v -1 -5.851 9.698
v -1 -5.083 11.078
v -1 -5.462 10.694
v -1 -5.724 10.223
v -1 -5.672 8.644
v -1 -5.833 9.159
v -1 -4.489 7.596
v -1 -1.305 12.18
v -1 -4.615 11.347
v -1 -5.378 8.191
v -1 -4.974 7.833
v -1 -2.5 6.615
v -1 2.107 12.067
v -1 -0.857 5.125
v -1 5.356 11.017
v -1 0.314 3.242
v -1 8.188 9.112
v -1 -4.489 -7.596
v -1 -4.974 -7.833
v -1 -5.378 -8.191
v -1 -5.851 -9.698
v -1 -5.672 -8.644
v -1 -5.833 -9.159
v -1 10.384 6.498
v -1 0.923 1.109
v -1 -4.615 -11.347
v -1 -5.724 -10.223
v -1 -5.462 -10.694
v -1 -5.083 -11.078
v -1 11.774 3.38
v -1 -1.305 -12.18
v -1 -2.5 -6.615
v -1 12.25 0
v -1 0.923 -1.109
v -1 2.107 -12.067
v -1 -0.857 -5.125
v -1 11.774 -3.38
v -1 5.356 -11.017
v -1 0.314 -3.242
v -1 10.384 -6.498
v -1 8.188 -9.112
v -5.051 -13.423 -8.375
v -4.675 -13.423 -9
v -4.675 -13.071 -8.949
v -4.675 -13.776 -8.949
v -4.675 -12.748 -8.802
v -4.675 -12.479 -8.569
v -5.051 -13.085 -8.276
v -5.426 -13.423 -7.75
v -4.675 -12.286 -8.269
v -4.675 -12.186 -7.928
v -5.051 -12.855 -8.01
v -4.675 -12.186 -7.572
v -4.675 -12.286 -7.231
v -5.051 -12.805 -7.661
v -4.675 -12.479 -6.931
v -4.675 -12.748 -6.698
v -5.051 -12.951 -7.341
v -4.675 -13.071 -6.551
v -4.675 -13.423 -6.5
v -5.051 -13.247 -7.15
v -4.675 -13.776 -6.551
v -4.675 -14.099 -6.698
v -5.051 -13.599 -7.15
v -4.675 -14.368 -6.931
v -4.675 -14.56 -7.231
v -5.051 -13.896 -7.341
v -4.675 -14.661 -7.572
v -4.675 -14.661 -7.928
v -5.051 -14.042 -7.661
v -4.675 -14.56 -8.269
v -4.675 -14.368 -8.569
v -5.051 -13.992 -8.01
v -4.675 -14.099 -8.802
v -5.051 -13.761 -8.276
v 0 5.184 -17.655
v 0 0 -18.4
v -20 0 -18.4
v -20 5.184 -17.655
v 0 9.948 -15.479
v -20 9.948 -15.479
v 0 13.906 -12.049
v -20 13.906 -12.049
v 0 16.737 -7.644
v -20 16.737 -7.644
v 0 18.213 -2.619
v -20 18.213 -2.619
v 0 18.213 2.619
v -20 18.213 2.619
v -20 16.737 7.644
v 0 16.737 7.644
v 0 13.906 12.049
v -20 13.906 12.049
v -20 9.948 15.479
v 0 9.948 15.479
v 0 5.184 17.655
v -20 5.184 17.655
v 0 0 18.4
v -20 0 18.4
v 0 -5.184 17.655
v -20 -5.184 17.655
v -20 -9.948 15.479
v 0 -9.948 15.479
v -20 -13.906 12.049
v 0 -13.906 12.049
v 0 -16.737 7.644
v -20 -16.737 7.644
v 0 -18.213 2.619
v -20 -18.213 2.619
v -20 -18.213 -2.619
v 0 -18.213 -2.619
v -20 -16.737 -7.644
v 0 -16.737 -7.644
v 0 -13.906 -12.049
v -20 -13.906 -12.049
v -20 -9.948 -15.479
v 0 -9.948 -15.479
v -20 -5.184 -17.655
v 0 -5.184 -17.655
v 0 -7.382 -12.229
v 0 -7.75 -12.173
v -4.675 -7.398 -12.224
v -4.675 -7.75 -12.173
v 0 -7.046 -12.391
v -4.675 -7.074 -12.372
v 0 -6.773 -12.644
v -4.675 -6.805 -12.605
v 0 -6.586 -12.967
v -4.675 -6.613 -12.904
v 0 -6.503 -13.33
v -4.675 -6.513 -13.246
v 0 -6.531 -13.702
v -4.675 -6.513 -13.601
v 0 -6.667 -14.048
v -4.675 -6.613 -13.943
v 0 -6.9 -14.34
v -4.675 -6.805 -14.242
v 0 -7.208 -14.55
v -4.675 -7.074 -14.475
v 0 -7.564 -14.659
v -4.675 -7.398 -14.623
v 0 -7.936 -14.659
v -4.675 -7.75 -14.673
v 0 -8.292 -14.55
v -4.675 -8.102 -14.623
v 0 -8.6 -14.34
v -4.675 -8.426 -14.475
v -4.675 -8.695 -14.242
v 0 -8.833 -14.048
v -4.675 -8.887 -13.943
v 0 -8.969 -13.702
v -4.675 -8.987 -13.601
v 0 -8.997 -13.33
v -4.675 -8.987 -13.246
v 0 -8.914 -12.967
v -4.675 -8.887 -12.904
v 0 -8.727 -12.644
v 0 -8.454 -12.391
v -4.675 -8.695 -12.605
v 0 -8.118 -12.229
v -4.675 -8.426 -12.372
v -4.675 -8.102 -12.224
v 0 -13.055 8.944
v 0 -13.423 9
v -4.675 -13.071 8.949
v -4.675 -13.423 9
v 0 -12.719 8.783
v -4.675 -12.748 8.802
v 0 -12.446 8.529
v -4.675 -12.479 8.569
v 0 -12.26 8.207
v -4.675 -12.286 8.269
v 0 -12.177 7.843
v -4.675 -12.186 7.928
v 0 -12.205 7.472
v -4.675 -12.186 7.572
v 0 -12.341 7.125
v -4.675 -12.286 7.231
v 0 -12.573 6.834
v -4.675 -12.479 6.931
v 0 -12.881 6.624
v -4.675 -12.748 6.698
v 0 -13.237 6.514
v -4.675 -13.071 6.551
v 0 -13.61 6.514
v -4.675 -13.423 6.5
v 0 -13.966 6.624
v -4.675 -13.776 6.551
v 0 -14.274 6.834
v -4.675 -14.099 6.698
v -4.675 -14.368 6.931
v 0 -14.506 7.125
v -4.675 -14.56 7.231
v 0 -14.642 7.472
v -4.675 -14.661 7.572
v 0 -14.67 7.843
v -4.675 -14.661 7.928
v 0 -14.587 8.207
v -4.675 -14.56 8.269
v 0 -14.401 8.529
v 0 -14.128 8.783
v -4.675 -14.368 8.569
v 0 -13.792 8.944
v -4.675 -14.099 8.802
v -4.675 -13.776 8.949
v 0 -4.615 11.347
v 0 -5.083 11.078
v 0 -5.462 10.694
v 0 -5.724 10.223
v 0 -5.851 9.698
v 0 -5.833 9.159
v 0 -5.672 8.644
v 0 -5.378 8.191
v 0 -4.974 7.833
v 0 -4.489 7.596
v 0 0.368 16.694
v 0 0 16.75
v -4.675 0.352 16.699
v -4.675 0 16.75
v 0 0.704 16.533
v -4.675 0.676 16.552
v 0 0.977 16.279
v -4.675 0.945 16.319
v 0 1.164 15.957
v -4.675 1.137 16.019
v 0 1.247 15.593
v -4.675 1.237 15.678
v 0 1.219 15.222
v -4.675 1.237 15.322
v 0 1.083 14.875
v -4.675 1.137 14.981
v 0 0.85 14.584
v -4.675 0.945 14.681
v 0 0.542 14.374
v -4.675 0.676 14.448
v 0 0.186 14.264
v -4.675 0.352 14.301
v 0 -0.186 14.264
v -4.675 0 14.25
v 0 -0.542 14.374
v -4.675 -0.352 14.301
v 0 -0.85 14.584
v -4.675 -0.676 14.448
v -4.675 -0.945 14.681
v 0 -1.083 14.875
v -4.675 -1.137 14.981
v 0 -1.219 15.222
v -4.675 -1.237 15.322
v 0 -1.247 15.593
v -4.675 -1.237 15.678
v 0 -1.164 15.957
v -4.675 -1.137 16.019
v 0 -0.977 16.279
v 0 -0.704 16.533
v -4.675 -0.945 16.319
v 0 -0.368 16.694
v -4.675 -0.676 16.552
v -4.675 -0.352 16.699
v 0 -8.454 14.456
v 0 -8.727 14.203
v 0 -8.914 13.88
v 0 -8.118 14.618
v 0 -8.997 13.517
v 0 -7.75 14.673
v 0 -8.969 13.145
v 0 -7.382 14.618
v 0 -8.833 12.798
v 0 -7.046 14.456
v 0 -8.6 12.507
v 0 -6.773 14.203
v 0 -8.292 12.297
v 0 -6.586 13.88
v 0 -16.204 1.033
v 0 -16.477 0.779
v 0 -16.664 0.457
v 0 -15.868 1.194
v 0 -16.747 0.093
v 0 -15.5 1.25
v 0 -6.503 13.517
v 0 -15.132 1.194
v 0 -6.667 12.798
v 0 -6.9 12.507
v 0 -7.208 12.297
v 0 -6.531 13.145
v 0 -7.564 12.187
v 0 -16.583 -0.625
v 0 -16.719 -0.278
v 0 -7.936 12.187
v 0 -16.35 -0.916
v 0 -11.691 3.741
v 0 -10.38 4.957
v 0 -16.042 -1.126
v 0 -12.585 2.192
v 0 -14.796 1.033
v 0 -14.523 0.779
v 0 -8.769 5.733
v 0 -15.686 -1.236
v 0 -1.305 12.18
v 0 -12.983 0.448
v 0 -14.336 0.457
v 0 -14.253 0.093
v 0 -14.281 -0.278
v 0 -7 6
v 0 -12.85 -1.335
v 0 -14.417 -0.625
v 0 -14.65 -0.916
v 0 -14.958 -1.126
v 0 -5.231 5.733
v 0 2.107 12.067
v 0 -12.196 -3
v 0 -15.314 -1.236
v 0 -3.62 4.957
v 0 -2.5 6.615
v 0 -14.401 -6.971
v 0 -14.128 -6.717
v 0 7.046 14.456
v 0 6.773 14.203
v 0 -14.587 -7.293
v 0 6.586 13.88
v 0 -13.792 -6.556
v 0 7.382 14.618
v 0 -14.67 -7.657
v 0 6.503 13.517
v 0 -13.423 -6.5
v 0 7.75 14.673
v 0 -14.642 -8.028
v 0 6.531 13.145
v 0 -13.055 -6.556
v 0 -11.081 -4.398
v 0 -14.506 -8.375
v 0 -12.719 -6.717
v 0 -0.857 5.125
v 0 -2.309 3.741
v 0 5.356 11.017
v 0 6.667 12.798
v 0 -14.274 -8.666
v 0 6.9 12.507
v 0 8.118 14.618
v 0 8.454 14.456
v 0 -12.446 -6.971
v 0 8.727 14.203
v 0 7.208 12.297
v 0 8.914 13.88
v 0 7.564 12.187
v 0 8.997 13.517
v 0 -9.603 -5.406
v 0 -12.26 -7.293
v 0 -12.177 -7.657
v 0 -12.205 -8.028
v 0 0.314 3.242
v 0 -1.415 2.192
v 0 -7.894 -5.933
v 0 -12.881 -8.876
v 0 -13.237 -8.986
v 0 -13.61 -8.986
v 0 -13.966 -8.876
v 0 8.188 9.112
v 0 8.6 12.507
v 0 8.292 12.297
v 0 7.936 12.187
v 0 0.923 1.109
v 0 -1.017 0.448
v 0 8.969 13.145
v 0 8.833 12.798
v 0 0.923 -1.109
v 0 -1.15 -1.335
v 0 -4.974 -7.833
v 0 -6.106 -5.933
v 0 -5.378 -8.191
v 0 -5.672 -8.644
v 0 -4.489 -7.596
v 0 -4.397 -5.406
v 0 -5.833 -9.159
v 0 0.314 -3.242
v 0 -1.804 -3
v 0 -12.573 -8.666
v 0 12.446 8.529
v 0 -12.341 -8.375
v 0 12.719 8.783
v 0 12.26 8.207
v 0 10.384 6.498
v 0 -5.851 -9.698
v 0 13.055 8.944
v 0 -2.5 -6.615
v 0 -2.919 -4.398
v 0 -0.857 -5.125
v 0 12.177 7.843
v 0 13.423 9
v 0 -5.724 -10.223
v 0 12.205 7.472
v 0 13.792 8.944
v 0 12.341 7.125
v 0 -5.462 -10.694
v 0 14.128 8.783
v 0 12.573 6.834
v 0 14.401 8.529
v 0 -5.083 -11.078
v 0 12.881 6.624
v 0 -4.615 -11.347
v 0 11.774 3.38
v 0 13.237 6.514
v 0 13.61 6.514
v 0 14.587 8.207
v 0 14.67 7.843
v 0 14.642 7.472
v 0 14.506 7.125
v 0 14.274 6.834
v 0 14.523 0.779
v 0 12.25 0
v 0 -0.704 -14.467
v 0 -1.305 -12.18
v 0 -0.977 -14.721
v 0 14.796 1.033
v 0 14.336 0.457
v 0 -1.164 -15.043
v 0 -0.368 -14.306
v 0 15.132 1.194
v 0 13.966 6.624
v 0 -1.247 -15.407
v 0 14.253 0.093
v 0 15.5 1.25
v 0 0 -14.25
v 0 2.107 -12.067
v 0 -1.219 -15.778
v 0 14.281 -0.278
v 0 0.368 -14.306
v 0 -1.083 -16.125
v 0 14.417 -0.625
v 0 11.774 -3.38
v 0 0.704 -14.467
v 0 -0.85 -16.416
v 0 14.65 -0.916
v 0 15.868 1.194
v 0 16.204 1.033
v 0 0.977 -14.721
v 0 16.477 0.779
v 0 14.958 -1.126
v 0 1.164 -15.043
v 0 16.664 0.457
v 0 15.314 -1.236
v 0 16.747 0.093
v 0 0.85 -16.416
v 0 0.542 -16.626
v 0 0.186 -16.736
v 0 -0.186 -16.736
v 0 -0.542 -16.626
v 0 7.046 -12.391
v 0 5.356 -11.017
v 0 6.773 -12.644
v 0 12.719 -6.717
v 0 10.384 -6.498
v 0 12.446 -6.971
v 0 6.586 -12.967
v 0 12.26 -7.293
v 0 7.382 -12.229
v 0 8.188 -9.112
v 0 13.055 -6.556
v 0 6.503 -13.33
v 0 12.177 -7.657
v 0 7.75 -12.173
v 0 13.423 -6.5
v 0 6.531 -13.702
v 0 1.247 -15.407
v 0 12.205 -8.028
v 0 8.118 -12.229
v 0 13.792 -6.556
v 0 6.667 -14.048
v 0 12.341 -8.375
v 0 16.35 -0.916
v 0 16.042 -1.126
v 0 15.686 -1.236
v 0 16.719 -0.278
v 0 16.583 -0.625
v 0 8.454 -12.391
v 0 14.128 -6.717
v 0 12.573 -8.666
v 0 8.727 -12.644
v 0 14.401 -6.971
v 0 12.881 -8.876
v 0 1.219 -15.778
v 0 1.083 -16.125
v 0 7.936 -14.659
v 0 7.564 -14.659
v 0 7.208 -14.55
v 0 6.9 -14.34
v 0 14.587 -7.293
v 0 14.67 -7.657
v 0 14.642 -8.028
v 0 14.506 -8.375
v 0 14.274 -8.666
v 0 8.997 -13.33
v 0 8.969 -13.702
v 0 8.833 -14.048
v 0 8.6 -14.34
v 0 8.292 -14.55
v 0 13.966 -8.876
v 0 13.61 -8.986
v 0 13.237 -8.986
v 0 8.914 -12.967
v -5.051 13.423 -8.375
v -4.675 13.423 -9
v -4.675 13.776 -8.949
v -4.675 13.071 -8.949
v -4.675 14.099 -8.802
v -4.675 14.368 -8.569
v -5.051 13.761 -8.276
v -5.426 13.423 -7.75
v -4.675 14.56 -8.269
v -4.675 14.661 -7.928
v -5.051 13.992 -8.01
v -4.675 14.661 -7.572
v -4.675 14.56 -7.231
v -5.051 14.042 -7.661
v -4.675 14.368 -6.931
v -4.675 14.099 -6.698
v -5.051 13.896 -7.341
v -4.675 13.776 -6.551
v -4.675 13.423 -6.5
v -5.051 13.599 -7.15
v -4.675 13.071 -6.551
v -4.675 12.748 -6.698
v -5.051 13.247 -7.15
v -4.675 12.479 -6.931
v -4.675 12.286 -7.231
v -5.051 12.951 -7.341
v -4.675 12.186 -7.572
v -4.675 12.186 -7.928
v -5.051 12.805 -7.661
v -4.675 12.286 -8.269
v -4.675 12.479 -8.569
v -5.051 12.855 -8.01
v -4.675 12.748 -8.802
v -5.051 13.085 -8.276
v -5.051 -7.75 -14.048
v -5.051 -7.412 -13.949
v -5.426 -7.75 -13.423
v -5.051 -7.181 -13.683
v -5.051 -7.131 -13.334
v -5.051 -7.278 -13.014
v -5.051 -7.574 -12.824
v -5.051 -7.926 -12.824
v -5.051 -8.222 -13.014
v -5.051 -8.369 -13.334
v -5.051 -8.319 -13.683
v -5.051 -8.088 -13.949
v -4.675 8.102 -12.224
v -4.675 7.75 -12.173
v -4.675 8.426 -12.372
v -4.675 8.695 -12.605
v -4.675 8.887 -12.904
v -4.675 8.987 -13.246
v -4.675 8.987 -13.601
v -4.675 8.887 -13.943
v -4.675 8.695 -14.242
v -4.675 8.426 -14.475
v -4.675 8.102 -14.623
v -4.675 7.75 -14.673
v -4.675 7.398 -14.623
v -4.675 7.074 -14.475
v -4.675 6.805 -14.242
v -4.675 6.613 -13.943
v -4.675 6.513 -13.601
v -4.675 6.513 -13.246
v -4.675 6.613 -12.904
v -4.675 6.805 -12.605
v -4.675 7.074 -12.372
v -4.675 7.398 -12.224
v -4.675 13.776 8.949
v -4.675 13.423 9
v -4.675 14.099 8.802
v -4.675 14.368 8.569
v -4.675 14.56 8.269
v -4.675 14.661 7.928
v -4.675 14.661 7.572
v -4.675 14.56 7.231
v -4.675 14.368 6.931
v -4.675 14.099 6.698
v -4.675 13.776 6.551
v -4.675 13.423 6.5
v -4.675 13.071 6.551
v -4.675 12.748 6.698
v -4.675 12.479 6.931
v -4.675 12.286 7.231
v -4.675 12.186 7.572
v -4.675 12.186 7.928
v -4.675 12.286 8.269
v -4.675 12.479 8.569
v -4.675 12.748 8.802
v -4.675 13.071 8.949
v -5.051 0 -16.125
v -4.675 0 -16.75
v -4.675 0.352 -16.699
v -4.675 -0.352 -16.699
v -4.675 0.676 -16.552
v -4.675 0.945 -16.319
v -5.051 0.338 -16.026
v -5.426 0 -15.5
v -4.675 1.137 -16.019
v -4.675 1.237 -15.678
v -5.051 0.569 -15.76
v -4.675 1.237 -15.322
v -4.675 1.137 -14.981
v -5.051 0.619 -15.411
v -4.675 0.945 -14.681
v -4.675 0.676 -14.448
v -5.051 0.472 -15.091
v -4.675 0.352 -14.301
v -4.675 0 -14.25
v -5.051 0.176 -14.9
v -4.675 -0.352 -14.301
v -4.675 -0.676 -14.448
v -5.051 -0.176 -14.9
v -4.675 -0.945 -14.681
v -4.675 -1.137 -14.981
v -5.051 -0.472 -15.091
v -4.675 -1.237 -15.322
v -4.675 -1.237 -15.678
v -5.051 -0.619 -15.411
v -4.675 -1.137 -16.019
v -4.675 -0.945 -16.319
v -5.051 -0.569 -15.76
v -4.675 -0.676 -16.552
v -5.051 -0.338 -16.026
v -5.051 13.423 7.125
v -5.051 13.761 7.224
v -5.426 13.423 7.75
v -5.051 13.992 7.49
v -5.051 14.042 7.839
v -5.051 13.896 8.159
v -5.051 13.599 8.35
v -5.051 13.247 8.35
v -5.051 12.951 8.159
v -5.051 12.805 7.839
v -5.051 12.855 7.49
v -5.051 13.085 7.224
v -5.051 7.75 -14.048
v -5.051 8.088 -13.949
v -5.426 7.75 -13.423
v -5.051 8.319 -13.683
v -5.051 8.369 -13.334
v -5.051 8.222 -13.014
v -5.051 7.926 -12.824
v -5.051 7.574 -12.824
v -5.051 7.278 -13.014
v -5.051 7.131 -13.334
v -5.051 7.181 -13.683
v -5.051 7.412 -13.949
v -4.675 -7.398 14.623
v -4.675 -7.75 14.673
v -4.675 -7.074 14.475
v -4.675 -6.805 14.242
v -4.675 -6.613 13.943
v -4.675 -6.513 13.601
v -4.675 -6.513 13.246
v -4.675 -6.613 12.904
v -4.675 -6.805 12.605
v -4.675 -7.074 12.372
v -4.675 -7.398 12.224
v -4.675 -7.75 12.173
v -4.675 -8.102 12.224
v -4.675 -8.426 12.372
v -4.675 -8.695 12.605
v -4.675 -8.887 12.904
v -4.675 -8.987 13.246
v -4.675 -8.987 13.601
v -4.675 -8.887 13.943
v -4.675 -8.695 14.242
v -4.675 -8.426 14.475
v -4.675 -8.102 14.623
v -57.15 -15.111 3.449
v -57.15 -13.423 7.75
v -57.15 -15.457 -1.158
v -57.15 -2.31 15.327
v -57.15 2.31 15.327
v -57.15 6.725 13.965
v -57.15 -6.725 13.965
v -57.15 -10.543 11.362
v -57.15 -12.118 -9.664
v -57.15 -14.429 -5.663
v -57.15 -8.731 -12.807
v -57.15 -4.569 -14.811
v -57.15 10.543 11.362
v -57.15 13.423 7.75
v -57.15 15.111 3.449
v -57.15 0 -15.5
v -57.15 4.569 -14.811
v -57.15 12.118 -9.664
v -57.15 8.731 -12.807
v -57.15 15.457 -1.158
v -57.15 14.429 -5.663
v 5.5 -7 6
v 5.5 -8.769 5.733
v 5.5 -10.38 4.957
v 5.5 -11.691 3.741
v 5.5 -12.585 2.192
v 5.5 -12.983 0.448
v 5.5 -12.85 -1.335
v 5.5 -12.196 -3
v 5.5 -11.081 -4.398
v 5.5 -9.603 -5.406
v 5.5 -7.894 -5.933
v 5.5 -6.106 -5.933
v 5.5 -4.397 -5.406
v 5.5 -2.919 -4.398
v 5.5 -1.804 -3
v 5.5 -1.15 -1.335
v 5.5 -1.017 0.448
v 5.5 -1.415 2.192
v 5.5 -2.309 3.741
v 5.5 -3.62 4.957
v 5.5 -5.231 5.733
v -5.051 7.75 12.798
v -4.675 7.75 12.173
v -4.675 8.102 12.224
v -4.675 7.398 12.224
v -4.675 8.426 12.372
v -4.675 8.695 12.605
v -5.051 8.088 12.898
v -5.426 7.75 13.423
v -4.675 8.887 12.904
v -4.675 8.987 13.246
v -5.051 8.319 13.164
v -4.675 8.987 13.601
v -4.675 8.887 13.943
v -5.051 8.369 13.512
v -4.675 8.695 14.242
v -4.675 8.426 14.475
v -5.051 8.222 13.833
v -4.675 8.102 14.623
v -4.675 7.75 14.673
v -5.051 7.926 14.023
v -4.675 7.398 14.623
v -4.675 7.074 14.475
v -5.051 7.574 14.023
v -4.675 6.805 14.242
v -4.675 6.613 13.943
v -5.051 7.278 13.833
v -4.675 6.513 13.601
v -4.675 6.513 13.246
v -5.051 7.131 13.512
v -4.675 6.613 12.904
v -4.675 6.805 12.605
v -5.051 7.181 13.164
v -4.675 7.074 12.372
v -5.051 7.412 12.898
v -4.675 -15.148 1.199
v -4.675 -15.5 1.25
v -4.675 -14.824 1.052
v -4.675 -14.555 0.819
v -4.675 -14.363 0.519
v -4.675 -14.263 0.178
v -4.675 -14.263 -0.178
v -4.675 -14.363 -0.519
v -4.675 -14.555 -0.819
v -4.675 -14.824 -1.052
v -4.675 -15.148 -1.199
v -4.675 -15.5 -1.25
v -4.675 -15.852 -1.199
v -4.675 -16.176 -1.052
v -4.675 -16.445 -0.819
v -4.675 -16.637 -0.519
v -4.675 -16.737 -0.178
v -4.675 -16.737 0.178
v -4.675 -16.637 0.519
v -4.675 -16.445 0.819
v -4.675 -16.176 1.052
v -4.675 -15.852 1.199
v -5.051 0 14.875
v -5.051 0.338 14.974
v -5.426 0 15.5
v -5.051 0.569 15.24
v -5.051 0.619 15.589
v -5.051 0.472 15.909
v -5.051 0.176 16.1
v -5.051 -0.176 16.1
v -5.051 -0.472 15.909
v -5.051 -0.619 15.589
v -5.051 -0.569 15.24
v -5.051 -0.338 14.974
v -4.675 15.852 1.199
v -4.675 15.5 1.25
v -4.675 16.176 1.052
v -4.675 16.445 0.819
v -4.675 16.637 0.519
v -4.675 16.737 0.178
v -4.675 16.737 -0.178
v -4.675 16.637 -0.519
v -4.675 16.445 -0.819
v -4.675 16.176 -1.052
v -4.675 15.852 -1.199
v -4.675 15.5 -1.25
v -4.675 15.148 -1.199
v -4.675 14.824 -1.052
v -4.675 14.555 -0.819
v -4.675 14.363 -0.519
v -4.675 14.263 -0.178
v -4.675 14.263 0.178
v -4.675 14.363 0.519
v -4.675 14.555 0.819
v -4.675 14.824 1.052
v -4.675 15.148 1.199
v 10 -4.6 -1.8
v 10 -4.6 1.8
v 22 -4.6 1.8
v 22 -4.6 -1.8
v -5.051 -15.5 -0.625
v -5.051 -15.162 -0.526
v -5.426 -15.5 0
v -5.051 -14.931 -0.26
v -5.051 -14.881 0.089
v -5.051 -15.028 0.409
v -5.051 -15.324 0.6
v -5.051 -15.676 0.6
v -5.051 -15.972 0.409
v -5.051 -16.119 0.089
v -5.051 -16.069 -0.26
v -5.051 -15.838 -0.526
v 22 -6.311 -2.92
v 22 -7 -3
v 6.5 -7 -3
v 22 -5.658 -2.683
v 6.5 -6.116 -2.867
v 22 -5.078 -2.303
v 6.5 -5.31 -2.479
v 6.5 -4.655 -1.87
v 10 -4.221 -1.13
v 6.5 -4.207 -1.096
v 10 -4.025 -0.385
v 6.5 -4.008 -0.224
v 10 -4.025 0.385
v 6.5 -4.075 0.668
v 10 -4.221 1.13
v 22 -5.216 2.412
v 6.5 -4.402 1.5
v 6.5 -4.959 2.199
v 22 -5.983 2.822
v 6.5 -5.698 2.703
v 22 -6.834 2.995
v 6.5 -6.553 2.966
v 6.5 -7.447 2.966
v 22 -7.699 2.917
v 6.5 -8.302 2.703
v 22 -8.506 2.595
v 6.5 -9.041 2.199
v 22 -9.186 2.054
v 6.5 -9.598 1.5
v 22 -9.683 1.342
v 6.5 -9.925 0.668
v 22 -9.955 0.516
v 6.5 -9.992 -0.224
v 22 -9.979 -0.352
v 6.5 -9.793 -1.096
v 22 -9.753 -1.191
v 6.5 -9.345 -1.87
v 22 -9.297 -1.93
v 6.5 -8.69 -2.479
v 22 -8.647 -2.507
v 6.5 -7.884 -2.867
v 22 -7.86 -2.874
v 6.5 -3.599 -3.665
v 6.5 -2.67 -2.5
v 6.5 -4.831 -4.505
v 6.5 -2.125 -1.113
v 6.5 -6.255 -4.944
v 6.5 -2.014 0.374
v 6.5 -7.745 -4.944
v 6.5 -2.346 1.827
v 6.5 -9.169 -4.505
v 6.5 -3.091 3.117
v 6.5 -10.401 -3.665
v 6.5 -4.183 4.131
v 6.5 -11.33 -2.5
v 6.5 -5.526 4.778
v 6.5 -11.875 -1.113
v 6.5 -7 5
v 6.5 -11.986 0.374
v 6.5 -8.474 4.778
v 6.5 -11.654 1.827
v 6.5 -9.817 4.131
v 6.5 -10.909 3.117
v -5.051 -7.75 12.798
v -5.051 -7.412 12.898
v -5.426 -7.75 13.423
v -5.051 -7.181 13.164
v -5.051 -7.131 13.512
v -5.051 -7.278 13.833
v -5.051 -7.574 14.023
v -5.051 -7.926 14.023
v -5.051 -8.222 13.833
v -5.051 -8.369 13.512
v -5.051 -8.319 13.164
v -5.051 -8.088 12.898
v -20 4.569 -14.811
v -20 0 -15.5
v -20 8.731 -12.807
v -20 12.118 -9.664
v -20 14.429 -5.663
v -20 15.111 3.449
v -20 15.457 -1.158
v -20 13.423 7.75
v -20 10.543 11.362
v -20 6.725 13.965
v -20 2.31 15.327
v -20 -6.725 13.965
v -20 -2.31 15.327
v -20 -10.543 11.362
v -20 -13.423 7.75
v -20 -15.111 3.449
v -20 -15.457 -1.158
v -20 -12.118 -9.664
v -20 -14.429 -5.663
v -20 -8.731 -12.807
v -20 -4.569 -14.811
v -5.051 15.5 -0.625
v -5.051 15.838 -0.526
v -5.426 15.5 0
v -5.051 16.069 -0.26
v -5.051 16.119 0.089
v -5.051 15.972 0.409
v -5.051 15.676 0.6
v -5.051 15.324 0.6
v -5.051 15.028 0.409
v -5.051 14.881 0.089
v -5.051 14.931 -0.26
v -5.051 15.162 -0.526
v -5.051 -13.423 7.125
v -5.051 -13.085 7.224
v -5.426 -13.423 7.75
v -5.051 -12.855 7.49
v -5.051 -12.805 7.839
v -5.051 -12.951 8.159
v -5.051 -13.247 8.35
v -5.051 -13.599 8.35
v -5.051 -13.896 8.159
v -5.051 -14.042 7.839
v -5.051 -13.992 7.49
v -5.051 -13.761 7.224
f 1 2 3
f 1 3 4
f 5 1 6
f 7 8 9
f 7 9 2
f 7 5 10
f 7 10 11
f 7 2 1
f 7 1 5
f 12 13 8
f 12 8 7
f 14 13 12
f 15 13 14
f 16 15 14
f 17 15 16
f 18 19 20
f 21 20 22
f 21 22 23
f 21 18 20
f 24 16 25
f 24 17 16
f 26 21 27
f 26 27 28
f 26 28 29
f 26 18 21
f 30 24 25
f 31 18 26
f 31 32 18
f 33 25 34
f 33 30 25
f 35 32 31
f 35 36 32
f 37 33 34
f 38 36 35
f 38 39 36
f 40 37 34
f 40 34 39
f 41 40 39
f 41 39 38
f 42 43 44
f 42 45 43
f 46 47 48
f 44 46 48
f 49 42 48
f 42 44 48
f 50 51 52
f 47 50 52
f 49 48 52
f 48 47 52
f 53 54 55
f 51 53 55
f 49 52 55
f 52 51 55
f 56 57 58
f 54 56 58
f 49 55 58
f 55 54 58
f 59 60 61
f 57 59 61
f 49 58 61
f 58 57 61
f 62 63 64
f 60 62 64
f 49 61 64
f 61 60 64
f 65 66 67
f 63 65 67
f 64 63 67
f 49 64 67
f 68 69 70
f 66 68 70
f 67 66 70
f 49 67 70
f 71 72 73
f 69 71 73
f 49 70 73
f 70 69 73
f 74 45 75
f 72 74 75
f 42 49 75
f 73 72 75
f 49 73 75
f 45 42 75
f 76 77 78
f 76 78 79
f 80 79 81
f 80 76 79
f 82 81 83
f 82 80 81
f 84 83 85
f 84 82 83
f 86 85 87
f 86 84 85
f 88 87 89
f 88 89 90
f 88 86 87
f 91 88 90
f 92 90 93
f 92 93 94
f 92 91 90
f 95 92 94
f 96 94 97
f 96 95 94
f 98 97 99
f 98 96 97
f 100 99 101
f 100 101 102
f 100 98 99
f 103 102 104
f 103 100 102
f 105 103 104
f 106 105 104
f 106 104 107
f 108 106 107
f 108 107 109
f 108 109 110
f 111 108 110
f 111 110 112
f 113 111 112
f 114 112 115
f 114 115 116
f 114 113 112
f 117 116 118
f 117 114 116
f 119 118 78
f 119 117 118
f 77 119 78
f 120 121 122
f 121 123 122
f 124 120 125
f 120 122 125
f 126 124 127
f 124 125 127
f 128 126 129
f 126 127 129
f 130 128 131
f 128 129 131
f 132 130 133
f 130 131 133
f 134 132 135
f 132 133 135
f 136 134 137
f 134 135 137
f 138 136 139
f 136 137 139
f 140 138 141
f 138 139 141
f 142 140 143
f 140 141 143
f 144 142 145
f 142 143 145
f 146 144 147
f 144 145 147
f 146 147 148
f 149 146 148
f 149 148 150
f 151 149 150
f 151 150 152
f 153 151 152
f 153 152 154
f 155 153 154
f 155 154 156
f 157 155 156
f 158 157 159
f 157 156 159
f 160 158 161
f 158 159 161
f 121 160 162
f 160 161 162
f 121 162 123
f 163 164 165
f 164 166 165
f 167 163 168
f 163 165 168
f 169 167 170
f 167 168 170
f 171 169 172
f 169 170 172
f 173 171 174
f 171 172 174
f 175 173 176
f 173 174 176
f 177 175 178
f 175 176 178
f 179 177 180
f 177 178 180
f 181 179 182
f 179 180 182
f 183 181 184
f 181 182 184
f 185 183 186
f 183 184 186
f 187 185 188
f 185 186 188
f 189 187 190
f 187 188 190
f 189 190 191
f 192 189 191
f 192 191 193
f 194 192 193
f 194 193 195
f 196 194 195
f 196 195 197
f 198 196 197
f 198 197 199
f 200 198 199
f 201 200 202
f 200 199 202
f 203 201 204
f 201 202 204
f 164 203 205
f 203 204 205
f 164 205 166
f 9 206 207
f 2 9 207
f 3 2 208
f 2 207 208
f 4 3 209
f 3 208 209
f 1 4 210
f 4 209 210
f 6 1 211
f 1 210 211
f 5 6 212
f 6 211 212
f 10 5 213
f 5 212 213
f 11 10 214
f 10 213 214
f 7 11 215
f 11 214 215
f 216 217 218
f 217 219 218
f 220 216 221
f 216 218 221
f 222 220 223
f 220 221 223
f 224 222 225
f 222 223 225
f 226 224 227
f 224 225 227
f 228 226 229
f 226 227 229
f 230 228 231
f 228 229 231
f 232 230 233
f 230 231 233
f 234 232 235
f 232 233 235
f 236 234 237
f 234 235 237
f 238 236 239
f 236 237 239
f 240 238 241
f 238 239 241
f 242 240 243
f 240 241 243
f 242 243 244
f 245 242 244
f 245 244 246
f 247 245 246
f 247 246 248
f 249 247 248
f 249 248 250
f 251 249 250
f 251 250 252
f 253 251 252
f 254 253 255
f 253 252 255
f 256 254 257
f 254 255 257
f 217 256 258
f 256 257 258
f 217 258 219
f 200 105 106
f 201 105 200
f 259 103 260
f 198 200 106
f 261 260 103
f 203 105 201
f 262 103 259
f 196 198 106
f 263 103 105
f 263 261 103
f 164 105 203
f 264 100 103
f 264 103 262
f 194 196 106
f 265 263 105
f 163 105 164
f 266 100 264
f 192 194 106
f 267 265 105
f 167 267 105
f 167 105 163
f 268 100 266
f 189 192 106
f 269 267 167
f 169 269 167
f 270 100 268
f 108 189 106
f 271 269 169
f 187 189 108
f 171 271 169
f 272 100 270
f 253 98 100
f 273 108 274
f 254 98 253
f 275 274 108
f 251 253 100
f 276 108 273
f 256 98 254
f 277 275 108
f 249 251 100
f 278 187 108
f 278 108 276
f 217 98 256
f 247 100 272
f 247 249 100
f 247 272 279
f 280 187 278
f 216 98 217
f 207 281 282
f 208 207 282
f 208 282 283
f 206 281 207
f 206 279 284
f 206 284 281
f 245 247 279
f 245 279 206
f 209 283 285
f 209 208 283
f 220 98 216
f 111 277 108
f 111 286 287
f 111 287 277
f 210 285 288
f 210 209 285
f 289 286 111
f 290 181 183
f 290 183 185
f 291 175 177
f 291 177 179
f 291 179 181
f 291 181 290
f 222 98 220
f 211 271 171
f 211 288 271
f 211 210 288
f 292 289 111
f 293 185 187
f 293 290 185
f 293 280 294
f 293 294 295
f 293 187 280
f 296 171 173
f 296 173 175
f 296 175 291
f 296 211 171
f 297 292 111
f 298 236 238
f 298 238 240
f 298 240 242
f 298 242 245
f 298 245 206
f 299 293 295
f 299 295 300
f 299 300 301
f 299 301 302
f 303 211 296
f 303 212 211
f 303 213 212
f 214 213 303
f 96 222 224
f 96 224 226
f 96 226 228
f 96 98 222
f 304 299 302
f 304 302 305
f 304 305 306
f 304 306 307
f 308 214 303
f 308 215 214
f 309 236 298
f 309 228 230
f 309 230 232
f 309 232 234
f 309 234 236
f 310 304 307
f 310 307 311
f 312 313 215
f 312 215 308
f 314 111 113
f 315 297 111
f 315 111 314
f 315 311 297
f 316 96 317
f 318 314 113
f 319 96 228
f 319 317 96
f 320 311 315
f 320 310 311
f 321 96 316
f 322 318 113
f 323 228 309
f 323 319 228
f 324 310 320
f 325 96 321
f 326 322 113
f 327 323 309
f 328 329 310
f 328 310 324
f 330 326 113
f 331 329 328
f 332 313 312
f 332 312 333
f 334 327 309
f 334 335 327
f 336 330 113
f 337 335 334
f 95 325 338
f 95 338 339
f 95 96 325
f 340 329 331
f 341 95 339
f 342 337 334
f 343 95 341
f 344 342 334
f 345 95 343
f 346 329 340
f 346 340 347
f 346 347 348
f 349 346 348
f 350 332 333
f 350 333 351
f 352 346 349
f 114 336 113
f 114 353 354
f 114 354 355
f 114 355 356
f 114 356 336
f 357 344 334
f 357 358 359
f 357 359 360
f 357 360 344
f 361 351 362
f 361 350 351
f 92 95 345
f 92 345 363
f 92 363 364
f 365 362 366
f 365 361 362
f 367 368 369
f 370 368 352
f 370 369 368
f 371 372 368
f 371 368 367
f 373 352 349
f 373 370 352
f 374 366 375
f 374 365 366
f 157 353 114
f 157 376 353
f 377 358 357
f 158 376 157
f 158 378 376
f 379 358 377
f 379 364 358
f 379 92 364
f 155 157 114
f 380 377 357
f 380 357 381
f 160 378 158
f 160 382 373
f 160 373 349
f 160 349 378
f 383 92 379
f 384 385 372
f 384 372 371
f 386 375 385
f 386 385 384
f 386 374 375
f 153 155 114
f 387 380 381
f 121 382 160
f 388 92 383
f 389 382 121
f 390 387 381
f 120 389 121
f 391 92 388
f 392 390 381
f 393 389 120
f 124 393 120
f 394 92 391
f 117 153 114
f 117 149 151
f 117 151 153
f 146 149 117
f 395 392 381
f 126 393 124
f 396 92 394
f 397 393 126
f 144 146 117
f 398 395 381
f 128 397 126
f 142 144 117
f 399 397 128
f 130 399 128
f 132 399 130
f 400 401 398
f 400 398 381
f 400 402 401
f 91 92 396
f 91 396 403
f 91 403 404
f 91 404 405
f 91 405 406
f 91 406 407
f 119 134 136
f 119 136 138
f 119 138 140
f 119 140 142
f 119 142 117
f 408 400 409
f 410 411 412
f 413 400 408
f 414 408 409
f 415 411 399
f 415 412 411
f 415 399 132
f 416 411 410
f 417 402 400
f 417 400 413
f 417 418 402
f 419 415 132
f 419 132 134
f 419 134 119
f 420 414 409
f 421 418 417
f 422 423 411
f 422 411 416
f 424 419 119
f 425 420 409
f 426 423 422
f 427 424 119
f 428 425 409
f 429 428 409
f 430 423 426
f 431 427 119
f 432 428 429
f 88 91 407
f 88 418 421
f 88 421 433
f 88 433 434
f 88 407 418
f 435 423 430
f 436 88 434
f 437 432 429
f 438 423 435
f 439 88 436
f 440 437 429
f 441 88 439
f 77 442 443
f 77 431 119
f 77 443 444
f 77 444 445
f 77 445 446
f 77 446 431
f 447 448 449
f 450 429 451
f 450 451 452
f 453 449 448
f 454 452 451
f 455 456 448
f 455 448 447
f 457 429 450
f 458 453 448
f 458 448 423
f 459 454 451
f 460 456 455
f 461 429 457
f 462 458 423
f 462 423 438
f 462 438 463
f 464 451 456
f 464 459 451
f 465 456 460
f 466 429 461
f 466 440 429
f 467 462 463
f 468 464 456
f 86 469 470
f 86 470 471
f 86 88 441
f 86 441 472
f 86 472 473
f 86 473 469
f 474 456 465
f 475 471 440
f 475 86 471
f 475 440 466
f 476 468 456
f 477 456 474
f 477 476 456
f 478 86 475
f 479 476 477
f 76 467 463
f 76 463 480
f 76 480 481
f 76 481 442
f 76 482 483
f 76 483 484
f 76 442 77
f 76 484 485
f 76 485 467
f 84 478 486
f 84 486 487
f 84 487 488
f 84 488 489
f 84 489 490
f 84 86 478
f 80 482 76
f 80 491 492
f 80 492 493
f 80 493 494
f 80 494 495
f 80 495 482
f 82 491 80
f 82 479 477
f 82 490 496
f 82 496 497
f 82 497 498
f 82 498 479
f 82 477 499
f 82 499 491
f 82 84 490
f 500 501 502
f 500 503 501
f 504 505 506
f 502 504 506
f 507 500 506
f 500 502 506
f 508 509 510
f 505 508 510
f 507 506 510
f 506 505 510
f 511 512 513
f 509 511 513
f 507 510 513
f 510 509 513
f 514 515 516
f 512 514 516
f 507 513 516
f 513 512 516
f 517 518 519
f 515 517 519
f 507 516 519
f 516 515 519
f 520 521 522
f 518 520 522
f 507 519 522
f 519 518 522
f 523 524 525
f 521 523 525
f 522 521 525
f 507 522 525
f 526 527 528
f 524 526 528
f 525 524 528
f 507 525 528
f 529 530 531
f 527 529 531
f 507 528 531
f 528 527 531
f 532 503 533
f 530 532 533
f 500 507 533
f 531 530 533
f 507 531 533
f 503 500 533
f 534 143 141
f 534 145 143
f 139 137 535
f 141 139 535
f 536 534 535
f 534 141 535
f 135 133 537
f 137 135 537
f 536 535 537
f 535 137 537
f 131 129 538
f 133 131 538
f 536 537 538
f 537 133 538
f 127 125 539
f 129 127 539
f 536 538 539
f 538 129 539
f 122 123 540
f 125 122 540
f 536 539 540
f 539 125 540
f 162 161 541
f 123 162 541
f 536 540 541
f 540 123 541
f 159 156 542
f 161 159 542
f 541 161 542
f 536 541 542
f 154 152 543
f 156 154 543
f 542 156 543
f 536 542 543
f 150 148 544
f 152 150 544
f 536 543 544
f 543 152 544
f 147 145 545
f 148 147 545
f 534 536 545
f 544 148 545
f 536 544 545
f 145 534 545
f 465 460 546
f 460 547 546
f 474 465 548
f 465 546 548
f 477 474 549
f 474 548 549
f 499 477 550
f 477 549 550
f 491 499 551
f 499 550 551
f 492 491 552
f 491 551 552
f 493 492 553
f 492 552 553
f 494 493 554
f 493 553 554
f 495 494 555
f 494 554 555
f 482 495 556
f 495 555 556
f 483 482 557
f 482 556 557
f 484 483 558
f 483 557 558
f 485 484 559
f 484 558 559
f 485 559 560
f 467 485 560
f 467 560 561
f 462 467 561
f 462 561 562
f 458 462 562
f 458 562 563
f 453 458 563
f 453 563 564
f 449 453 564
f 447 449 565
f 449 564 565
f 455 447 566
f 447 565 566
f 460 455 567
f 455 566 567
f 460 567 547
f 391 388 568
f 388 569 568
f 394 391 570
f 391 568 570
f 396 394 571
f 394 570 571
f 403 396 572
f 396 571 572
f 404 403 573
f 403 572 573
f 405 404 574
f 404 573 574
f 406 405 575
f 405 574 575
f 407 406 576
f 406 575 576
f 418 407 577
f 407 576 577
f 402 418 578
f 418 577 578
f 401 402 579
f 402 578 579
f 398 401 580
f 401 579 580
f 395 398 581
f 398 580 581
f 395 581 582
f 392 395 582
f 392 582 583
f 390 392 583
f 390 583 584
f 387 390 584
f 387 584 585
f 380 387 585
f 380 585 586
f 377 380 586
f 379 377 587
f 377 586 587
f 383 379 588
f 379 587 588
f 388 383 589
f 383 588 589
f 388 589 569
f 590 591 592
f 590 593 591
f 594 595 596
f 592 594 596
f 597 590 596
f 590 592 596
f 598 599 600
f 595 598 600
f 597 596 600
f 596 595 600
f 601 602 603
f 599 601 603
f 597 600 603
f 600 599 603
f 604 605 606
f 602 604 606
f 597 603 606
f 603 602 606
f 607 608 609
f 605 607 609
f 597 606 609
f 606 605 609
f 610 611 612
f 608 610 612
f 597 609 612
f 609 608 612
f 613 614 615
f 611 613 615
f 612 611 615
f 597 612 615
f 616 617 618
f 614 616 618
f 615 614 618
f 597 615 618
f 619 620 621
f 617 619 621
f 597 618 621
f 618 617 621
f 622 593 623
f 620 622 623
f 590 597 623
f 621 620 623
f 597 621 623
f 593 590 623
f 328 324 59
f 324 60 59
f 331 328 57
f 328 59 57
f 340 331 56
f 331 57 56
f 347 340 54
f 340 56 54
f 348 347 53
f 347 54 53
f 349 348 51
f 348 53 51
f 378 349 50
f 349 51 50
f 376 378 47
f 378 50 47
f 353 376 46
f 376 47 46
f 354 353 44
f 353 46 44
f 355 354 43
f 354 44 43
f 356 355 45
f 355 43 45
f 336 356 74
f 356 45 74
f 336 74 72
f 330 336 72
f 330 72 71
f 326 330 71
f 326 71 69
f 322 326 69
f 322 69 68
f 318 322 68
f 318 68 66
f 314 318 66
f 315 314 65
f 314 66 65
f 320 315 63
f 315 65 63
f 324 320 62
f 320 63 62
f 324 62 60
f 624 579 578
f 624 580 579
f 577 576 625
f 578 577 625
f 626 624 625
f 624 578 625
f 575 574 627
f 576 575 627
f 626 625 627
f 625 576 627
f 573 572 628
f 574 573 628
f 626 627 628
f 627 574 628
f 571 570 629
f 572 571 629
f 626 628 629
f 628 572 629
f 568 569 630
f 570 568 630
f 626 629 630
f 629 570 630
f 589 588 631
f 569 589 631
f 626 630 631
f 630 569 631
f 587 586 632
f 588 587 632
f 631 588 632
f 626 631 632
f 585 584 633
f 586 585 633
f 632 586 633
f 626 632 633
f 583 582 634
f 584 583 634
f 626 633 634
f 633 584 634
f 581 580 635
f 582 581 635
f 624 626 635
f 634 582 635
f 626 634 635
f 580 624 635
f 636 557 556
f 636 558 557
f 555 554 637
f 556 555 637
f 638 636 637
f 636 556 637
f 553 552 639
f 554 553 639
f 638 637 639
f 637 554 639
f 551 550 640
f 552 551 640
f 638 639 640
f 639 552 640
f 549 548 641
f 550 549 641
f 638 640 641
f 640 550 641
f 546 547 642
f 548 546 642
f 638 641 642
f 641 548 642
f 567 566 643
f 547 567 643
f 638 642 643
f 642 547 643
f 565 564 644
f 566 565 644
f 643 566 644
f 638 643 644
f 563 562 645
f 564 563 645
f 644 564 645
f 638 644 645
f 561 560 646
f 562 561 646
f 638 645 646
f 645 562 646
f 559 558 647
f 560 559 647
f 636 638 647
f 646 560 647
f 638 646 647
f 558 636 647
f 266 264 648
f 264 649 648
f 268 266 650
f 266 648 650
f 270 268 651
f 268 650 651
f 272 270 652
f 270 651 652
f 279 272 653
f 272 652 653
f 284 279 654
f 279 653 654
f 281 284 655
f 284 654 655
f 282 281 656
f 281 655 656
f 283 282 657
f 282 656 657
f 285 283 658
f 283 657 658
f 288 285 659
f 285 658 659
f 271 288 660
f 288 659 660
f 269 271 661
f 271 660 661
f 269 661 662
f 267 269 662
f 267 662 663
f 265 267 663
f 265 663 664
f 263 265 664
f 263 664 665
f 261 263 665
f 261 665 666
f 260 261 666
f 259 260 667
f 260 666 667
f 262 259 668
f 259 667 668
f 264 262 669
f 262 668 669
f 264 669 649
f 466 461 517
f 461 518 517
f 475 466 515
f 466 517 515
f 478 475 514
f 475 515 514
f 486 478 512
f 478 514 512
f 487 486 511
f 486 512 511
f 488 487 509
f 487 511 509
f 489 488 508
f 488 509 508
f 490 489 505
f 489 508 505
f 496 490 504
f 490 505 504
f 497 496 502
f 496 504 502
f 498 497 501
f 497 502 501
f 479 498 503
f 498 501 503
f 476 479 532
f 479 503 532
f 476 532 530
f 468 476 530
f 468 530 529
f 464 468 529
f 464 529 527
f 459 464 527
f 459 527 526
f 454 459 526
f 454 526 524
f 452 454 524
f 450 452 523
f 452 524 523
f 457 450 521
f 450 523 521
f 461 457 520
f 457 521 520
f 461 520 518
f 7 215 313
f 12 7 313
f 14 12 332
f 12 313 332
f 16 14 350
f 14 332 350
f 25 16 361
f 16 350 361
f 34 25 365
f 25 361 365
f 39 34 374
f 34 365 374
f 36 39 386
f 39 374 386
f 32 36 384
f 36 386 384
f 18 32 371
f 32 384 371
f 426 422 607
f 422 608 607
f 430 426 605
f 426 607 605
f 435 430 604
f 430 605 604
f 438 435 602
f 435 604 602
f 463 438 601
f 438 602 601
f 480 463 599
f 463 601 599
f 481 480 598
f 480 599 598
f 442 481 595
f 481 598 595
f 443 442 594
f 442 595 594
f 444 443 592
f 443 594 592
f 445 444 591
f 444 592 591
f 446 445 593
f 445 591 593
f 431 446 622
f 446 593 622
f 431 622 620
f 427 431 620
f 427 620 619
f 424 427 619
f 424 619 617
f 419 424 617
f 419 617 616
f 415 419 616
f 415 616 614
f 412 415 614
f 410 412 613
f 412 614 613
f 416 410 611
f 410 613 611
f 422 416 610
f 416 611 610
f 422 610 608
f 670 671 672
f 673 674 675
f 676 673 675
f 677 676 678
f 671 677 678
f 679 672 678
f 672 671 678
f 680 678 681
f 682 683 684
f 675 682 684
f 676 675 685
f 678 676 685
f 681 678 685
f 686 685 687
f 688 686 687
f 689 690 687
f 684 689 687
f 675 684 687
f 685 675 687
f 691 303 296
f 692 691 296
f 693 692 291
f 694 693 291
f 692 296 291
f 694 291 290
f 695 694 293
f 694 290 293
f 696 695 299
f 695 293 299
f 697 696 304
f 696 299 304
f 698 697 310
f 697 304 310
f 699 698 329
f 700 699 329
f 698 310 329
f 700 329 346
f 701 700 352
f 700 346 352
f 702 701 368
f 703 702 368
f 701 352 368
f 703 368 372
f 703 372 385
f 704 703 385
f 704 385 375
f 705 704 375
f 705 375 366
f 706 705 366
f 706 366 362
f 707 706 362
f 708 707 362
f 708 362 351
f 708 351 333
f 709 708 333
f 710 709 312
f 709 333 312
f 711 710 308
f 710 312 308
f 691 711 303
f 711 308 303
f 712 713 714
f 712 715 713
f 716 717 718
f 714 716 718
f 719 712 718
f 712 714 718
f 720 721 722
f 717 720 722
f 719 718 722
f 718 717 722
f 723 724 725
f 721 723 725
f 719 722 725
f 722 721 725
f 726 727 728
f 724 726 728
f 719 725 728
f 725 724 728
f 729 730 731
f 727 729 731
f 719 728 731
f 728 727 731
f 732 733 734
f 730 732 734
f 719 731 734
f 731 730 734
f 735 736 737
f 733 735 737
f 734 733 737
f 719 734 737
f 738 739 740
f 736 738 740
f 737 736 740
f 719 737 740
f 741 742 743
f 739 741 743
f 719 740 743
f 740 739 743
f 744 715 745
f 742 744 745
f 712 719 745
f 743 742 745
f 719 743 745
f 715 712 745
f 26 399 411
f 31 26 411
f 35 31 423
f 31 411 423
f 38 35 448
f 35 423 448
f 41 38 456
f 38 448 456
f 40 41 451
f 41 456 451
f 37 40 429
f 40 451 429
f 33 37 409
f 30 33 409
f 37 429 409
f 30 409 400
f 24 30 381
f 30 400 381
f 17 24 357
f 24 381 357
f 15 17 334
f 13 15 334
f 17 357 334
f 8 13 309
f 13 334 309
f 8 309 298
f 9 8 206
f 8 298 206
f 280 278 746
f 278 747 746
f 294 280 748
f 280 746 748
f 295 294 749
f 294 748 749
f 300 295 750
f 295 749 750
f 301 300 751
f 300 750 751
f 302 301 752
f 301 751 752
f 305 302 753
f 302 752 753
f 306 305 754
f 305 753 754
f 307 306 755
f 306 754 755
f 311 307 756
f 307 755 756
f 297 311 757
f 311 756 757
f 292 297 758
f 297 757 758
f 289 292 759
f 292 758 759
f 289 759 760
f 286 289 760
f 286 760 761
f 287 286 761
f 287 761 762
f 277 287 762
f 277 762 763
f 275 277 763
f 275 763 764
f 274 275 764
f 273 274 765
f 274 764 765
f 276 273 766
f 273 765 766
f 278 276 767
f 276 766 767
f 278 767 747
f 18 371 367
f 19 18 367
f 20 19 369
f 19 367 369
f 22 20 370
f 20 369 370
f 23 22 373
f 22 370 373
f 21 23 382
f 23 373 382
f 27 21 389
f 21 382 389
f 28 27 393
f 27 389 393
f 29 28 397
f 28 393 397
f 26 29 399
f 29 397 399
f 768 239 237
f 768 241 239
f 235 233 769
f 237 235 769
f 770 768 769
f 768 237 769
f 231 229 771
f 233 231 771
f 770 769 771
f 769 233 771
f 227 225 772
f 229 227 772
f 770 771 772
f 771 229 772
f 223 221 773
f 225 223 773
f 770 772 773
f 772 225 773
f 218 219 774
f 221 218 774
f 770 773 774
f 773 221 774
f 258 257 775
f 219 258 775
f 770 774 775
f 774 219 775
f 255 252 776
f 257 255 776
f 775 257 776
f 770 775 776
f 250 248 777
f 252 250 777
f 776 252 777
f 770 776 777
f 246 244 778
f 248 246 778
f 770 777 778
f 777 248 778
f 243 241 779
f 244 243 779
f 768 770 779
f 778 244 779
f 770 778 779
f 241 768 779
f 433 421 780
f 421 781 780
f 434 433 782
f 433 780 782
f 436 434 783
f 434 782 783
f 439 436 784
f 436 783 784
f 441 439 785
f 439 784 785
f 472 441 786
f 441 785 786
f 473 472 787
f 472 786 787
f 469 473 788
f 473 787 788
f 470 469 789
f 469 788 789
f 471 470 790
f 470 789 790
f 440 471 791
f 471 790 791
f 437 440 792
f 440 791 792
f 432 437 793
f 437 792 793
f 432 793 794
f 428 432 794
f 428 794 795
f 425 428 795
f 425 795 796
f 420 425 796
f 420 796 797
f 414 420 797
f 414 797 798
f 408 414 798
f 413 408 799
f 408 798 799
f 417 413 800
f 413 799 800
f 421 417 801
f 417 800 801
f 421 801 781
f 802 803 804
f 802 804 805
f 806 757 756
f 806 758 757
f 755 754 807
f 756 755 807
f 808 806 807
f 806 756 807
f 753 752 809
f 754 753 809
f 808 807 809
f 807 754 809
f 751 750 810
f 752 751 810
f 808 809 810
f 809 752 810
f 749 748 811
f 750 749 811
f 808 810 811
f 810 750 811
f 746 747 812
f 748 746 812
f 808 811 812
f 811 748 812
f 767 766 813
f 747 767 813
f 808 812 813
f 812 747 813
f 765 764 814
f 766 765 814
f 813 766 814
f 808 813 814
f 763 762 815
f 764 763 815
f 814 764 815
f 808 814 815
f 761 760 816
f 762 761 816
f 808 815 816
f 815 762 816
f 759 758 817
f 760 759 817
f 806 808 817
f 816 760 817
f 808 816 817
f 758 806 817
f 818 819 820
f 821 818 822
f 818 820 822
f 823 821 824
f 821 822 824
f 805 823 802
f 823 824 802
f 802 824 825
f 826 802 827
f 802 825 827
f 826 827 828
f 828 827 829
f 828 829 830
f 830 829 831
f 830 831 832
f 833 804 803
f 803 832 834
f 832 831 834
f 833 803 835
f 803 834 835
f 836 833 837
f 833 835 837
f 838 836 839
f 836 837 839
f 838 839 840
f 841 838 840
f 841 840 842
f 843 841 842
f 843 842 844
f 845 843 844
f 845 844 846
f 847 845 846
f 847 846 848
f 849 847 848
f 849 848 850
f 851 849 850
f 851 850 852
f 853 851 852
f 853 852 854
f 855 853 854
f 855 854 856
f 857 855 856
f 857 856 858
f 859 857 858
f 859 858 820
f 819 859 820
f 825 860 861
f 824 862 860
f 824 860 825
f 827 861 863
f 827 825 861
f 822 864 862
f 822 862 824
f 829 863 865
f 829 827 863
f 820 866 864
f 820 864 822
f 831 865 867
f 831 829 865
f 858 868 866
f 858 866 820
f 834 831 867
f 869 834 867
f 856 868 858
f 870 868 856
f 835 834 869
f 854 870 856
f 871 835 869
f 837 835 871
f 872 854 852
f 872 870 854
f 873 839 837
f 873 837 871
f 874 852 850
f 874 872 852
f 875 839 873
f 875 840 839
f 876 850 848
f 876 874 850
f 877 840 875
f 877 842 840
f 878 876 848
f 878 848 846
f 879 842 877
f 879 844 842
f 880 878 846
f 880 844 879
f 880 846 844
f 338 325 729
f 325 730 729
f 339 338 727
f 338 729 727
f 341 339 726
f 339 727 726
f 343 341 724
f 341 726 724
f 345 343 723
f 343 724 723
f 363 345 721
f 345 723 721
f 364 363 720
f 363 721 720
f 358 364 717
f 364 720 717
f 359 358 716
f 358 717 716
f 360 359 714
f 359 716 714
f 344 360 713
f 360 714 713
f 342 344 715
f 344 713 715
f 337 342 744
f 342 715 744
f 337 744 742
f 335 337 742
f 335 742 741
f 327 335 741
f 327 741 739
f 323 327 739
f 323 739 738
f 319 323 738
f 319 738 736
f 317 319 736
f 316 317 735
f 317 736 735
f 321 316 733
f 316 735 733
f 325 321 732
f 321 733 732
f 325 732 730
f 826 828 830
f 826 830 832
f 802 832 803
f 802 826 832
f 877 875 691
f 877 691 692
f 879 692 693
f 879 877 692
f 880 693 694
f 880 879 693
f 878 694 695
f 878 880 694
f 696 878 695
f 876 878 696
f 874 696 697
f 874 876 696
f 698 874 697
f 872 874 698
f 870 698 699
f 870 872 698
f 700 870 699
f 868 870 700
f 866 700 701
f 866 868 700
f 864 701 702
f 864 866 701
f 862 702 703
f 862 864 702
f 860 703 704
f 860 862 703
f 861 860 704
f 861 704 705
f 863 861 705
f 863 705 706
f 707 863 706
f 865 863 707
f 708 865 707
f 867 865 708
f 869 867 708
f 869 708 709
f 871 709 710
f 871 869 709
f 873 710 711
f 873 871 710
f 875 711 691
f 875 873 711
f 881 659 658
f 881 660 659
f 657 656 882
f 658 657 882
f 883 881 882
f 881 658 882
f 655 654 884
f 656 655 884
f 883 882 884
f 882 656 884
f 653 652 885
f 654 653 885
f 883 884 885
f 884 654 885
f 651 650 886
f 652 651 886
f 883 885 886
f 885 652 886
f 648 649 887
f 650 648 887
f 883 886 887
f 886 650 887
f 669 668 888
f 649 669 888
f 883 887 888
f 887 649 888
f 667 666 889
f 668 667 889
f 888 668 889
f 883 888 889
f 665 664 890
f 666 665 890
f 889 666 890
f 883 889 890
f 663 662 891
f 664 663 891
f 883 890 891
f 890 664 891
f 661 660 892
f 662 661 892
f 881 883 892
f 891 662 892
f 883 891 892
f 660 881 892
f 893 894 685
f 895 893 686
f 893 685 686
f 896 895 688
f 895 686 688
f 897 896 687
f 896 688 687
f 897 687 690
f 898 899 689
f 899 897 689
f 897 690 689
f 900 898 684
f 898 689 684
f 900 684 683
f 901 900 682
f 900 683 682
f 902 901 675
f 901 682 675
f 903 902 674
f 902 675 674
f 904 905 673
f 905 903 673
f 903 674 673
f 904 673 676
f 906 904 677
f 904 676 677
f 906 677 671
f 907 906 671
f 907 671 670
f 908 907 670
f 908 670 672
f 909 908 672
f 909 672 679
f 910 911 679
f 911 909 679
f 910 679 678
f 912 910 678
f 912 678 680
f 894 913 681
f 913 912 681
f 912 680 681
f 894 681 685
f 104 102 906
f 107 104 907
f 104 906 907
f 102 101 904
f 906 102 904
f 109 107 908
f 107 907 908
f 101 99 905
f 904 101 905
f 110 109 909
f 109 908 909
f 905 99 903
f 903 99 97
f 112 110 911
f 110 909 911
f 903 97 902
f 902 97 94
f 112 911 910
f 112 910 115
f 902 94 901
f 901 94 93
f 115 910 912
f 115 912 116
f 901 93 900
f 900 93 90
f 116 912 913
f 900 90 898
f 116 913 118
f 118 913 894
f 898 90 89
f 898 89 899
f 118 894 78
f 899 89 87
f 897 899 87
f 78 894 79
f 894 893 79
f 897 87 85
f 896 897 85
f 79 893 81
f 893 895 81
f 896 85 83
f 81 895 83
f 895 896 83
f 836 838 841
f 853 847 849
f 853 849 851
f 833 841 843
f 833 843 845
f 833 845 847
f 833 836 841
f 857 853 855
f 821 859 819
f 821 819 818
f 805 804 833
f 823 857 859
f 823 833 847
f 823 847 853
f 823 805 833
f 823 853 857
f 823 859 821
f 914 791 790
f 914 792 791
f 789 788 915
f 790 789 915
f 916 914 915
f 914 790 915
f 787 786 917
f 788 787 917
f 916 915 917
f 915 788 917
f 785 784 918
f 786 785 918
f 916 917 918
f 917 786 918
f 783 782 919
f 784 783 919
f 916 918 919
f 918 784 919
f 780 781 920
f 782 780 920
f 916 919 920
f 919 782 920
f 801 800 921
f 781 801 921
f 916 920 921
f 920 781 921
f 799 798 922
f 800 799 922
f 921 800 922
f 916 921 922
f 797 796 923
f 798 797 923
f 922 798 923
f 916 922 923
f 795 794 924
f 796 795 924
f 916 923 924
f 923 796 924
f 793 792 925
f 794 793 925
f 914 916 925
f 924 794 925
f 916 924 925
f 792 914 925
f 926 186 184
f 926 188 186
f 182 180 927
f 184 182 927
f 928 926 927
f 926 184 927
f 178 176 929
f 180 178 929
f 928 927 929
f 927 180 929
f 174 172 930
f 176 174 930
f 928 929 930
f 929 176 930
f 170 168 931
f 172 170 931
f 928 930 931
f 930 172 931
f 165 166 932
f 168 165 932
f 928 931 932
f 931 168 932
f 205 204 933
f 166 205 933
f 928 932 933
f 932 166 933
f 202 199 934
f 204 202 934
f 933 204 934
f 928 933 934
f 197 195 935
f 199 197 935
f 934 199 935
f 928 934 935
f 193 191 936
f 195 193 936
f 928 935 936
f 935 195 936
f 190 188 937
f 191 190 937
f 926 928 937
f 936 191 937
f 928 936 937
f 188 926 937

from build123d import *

# Parameters (mm, degrees)
SKETCH1_R                 = 6
SKETCH1_R_2               = 3
BOSS_EXTRUDE1_DEPTH       = 6.5
SKETCH1_3_R               = 3
BOSS_EXTRUDE2_DEPTH       = 22
SKETCH1_4_R               = 18.4
BOSS_EXTRUDE3_DEPTH       = 20
SKETCH1_5_R               = 15.5
BOSS_EXTRUDE4_DEPTH       = 57.15
M3X0_5_TAPPED_HOLE1_D     = 2.5
M3X0_5_TAPPED_HOLE1_DEPTH = 4.675
M3X0_5_TAPPED_HOLE1_TIP   = 0.751075774
CUT_EXTRUDE1_DEPTH        = 1
CUT_EXTRUDE2_START        = -12
CUT_EXTRUDE2_DEPTH        = 12
CHAMFER1_SIZE             = 1


with BuildPart() as part:
    # Sketch1 → Boss-Extrude1 (new body)
    with BuildSketch(Plane(origin=(0, 0, 0), x_dir=(0, 0, -1), z_dir=(1, 0, 0))):
        with Locations((0, -7)):
            Circle(SKETCH1_R)
        with Locations((0, -7)):
            Circle(SKETCH1_R_2, mode=Mode.SUBTRACT)
    extrude(amount=BOSS_EXTRUDE1_DEPTH)

    # Sketch1<3> → Boss-Extrude2 (add)
    with BuildSketch(Plane(origin=(0, 0, 0), x_dir=(0, 0, -1), z_dir=(1, 0, 0))):
        with Locations((0, -7)):
            Circle(SKETCH1_3_R)
    extrude(amount=BOSS_EXTRUDE2_DEPTH)



with BuildPart() as body_2:
    # Sketch1<4> → Boss-Extrude3 (new body)
    with BuildSketch(Plane(origin=(0, 0, 0), x_dir=(0, 0, -1), z_dir=(1, 0, 0))):
        Circle(SKETCH1_4_R)
    extrude(amount=-BOSS_EXTRUDE3_DEPTH)


with BuildPart() as part_1:
    add(part.part)

    add(body_2.part)  # Boss-Extrude4 merges body 2
    # Sketch1<5> → Boss-Extrude4 (add)
    with BuildSketch(Plane(origin=(0, 0, 0), x_dir=(0, 0, -1), z_dir=(1, 0, 0))):
        Circle(SKETCH1_5_R)
    extrude(amount=-BOSS_EXTRUDE4_DEPTH)

    # M3x0.5 Tapped Hole1
    with Locations(Plane(origin=(0, 0, 0), x_dir=(0, 0, -1), z_dir=(1, 0, 0))):
        with Locations((-13.423393759, 7.75), (-15.5, 0), (-13.423393759, -7.75), (-7.75, -13.423393759), (0, -15.5), (7.75, -13.423393759), (13.423393759, -7.75), (15.5, 0), (13.423393759, 7.75), (7.75, 13.423393759), (0, 15.5), (-7.75, 13.423393759)):
            Hole(M3X0_5_TAPPED_HOLE1_D / 2, depth=M3X0_5_TAPPED_HOLE1_DEPTH)
            with Locations((0, 0, -(M3X0_5_TAPPED_HOLE1_DEPTH + M3X0_5_TAPPED_HOLE1_TIP / 2))):  # 118° drill point
                Cone(0, M3X0_5_TAPPED_HOLE1_D / 2, M3X0_5_TAPPED_HOLE1_TIP, mode=Mode.SUBTRACT)

    # Sketch4 → Cut-Extrude1 (cut)
    with BuildSketch(Plane(origin=(0, 0, 0), x_dir=(0, 0, -1), z_dir=(1, 0, 0))):
        with BuildLine():
            ThreePointArc((11.347397534, -4.615091463), (0, 12.25), (-11.347397534, -4.615091463))
            ThreePointArc((-11.347397534, -4.615091463), (-9.427730891, -5.860483562), (-7.595808961, -4.489285714))
            ThreePointArc((-7.595808961, -4.489285714), (0, 1), (7.595808961, -4.489285714))
            ThreePointArc((7.595808961, -4.489285714), (9.427730891, -5.860483562), (11.347397534, -4.615091463))
        make_face()
    extrude(amount=-CUT_EXTRUDE1_DEPTH, mode=Mode.SUBTRACT)

    # Sketch5 → Cut-Extrude2 (cut)
    with BuildSketch(Plane(origin=(22, 0, 0), x_dir=(0, 0, -1), z_dir=(1, 0, 0)).offset(CUT_EXTRUDE2_START)):
        with BuildLine():
            Line((-1.8, -4.6), (1.8, -4.6))
            ThreePointArc((1.8, -4.6), (0, -4), (-1.8, -4.6))
        make_face()
    extrude(amount=CUT_EXTRUDE2_DEPTH, mode=Mode.SUBTRACT)

    # Chamfer1
    chamfer1_edges = [part_1.edges().sort_by_distance(p)[0] for p in [
        (6.5, -7, 6),
    ]]
    chamfer(chamfer1_edges, length=CHAMFER1_SIZE)


solid = part_1.part
